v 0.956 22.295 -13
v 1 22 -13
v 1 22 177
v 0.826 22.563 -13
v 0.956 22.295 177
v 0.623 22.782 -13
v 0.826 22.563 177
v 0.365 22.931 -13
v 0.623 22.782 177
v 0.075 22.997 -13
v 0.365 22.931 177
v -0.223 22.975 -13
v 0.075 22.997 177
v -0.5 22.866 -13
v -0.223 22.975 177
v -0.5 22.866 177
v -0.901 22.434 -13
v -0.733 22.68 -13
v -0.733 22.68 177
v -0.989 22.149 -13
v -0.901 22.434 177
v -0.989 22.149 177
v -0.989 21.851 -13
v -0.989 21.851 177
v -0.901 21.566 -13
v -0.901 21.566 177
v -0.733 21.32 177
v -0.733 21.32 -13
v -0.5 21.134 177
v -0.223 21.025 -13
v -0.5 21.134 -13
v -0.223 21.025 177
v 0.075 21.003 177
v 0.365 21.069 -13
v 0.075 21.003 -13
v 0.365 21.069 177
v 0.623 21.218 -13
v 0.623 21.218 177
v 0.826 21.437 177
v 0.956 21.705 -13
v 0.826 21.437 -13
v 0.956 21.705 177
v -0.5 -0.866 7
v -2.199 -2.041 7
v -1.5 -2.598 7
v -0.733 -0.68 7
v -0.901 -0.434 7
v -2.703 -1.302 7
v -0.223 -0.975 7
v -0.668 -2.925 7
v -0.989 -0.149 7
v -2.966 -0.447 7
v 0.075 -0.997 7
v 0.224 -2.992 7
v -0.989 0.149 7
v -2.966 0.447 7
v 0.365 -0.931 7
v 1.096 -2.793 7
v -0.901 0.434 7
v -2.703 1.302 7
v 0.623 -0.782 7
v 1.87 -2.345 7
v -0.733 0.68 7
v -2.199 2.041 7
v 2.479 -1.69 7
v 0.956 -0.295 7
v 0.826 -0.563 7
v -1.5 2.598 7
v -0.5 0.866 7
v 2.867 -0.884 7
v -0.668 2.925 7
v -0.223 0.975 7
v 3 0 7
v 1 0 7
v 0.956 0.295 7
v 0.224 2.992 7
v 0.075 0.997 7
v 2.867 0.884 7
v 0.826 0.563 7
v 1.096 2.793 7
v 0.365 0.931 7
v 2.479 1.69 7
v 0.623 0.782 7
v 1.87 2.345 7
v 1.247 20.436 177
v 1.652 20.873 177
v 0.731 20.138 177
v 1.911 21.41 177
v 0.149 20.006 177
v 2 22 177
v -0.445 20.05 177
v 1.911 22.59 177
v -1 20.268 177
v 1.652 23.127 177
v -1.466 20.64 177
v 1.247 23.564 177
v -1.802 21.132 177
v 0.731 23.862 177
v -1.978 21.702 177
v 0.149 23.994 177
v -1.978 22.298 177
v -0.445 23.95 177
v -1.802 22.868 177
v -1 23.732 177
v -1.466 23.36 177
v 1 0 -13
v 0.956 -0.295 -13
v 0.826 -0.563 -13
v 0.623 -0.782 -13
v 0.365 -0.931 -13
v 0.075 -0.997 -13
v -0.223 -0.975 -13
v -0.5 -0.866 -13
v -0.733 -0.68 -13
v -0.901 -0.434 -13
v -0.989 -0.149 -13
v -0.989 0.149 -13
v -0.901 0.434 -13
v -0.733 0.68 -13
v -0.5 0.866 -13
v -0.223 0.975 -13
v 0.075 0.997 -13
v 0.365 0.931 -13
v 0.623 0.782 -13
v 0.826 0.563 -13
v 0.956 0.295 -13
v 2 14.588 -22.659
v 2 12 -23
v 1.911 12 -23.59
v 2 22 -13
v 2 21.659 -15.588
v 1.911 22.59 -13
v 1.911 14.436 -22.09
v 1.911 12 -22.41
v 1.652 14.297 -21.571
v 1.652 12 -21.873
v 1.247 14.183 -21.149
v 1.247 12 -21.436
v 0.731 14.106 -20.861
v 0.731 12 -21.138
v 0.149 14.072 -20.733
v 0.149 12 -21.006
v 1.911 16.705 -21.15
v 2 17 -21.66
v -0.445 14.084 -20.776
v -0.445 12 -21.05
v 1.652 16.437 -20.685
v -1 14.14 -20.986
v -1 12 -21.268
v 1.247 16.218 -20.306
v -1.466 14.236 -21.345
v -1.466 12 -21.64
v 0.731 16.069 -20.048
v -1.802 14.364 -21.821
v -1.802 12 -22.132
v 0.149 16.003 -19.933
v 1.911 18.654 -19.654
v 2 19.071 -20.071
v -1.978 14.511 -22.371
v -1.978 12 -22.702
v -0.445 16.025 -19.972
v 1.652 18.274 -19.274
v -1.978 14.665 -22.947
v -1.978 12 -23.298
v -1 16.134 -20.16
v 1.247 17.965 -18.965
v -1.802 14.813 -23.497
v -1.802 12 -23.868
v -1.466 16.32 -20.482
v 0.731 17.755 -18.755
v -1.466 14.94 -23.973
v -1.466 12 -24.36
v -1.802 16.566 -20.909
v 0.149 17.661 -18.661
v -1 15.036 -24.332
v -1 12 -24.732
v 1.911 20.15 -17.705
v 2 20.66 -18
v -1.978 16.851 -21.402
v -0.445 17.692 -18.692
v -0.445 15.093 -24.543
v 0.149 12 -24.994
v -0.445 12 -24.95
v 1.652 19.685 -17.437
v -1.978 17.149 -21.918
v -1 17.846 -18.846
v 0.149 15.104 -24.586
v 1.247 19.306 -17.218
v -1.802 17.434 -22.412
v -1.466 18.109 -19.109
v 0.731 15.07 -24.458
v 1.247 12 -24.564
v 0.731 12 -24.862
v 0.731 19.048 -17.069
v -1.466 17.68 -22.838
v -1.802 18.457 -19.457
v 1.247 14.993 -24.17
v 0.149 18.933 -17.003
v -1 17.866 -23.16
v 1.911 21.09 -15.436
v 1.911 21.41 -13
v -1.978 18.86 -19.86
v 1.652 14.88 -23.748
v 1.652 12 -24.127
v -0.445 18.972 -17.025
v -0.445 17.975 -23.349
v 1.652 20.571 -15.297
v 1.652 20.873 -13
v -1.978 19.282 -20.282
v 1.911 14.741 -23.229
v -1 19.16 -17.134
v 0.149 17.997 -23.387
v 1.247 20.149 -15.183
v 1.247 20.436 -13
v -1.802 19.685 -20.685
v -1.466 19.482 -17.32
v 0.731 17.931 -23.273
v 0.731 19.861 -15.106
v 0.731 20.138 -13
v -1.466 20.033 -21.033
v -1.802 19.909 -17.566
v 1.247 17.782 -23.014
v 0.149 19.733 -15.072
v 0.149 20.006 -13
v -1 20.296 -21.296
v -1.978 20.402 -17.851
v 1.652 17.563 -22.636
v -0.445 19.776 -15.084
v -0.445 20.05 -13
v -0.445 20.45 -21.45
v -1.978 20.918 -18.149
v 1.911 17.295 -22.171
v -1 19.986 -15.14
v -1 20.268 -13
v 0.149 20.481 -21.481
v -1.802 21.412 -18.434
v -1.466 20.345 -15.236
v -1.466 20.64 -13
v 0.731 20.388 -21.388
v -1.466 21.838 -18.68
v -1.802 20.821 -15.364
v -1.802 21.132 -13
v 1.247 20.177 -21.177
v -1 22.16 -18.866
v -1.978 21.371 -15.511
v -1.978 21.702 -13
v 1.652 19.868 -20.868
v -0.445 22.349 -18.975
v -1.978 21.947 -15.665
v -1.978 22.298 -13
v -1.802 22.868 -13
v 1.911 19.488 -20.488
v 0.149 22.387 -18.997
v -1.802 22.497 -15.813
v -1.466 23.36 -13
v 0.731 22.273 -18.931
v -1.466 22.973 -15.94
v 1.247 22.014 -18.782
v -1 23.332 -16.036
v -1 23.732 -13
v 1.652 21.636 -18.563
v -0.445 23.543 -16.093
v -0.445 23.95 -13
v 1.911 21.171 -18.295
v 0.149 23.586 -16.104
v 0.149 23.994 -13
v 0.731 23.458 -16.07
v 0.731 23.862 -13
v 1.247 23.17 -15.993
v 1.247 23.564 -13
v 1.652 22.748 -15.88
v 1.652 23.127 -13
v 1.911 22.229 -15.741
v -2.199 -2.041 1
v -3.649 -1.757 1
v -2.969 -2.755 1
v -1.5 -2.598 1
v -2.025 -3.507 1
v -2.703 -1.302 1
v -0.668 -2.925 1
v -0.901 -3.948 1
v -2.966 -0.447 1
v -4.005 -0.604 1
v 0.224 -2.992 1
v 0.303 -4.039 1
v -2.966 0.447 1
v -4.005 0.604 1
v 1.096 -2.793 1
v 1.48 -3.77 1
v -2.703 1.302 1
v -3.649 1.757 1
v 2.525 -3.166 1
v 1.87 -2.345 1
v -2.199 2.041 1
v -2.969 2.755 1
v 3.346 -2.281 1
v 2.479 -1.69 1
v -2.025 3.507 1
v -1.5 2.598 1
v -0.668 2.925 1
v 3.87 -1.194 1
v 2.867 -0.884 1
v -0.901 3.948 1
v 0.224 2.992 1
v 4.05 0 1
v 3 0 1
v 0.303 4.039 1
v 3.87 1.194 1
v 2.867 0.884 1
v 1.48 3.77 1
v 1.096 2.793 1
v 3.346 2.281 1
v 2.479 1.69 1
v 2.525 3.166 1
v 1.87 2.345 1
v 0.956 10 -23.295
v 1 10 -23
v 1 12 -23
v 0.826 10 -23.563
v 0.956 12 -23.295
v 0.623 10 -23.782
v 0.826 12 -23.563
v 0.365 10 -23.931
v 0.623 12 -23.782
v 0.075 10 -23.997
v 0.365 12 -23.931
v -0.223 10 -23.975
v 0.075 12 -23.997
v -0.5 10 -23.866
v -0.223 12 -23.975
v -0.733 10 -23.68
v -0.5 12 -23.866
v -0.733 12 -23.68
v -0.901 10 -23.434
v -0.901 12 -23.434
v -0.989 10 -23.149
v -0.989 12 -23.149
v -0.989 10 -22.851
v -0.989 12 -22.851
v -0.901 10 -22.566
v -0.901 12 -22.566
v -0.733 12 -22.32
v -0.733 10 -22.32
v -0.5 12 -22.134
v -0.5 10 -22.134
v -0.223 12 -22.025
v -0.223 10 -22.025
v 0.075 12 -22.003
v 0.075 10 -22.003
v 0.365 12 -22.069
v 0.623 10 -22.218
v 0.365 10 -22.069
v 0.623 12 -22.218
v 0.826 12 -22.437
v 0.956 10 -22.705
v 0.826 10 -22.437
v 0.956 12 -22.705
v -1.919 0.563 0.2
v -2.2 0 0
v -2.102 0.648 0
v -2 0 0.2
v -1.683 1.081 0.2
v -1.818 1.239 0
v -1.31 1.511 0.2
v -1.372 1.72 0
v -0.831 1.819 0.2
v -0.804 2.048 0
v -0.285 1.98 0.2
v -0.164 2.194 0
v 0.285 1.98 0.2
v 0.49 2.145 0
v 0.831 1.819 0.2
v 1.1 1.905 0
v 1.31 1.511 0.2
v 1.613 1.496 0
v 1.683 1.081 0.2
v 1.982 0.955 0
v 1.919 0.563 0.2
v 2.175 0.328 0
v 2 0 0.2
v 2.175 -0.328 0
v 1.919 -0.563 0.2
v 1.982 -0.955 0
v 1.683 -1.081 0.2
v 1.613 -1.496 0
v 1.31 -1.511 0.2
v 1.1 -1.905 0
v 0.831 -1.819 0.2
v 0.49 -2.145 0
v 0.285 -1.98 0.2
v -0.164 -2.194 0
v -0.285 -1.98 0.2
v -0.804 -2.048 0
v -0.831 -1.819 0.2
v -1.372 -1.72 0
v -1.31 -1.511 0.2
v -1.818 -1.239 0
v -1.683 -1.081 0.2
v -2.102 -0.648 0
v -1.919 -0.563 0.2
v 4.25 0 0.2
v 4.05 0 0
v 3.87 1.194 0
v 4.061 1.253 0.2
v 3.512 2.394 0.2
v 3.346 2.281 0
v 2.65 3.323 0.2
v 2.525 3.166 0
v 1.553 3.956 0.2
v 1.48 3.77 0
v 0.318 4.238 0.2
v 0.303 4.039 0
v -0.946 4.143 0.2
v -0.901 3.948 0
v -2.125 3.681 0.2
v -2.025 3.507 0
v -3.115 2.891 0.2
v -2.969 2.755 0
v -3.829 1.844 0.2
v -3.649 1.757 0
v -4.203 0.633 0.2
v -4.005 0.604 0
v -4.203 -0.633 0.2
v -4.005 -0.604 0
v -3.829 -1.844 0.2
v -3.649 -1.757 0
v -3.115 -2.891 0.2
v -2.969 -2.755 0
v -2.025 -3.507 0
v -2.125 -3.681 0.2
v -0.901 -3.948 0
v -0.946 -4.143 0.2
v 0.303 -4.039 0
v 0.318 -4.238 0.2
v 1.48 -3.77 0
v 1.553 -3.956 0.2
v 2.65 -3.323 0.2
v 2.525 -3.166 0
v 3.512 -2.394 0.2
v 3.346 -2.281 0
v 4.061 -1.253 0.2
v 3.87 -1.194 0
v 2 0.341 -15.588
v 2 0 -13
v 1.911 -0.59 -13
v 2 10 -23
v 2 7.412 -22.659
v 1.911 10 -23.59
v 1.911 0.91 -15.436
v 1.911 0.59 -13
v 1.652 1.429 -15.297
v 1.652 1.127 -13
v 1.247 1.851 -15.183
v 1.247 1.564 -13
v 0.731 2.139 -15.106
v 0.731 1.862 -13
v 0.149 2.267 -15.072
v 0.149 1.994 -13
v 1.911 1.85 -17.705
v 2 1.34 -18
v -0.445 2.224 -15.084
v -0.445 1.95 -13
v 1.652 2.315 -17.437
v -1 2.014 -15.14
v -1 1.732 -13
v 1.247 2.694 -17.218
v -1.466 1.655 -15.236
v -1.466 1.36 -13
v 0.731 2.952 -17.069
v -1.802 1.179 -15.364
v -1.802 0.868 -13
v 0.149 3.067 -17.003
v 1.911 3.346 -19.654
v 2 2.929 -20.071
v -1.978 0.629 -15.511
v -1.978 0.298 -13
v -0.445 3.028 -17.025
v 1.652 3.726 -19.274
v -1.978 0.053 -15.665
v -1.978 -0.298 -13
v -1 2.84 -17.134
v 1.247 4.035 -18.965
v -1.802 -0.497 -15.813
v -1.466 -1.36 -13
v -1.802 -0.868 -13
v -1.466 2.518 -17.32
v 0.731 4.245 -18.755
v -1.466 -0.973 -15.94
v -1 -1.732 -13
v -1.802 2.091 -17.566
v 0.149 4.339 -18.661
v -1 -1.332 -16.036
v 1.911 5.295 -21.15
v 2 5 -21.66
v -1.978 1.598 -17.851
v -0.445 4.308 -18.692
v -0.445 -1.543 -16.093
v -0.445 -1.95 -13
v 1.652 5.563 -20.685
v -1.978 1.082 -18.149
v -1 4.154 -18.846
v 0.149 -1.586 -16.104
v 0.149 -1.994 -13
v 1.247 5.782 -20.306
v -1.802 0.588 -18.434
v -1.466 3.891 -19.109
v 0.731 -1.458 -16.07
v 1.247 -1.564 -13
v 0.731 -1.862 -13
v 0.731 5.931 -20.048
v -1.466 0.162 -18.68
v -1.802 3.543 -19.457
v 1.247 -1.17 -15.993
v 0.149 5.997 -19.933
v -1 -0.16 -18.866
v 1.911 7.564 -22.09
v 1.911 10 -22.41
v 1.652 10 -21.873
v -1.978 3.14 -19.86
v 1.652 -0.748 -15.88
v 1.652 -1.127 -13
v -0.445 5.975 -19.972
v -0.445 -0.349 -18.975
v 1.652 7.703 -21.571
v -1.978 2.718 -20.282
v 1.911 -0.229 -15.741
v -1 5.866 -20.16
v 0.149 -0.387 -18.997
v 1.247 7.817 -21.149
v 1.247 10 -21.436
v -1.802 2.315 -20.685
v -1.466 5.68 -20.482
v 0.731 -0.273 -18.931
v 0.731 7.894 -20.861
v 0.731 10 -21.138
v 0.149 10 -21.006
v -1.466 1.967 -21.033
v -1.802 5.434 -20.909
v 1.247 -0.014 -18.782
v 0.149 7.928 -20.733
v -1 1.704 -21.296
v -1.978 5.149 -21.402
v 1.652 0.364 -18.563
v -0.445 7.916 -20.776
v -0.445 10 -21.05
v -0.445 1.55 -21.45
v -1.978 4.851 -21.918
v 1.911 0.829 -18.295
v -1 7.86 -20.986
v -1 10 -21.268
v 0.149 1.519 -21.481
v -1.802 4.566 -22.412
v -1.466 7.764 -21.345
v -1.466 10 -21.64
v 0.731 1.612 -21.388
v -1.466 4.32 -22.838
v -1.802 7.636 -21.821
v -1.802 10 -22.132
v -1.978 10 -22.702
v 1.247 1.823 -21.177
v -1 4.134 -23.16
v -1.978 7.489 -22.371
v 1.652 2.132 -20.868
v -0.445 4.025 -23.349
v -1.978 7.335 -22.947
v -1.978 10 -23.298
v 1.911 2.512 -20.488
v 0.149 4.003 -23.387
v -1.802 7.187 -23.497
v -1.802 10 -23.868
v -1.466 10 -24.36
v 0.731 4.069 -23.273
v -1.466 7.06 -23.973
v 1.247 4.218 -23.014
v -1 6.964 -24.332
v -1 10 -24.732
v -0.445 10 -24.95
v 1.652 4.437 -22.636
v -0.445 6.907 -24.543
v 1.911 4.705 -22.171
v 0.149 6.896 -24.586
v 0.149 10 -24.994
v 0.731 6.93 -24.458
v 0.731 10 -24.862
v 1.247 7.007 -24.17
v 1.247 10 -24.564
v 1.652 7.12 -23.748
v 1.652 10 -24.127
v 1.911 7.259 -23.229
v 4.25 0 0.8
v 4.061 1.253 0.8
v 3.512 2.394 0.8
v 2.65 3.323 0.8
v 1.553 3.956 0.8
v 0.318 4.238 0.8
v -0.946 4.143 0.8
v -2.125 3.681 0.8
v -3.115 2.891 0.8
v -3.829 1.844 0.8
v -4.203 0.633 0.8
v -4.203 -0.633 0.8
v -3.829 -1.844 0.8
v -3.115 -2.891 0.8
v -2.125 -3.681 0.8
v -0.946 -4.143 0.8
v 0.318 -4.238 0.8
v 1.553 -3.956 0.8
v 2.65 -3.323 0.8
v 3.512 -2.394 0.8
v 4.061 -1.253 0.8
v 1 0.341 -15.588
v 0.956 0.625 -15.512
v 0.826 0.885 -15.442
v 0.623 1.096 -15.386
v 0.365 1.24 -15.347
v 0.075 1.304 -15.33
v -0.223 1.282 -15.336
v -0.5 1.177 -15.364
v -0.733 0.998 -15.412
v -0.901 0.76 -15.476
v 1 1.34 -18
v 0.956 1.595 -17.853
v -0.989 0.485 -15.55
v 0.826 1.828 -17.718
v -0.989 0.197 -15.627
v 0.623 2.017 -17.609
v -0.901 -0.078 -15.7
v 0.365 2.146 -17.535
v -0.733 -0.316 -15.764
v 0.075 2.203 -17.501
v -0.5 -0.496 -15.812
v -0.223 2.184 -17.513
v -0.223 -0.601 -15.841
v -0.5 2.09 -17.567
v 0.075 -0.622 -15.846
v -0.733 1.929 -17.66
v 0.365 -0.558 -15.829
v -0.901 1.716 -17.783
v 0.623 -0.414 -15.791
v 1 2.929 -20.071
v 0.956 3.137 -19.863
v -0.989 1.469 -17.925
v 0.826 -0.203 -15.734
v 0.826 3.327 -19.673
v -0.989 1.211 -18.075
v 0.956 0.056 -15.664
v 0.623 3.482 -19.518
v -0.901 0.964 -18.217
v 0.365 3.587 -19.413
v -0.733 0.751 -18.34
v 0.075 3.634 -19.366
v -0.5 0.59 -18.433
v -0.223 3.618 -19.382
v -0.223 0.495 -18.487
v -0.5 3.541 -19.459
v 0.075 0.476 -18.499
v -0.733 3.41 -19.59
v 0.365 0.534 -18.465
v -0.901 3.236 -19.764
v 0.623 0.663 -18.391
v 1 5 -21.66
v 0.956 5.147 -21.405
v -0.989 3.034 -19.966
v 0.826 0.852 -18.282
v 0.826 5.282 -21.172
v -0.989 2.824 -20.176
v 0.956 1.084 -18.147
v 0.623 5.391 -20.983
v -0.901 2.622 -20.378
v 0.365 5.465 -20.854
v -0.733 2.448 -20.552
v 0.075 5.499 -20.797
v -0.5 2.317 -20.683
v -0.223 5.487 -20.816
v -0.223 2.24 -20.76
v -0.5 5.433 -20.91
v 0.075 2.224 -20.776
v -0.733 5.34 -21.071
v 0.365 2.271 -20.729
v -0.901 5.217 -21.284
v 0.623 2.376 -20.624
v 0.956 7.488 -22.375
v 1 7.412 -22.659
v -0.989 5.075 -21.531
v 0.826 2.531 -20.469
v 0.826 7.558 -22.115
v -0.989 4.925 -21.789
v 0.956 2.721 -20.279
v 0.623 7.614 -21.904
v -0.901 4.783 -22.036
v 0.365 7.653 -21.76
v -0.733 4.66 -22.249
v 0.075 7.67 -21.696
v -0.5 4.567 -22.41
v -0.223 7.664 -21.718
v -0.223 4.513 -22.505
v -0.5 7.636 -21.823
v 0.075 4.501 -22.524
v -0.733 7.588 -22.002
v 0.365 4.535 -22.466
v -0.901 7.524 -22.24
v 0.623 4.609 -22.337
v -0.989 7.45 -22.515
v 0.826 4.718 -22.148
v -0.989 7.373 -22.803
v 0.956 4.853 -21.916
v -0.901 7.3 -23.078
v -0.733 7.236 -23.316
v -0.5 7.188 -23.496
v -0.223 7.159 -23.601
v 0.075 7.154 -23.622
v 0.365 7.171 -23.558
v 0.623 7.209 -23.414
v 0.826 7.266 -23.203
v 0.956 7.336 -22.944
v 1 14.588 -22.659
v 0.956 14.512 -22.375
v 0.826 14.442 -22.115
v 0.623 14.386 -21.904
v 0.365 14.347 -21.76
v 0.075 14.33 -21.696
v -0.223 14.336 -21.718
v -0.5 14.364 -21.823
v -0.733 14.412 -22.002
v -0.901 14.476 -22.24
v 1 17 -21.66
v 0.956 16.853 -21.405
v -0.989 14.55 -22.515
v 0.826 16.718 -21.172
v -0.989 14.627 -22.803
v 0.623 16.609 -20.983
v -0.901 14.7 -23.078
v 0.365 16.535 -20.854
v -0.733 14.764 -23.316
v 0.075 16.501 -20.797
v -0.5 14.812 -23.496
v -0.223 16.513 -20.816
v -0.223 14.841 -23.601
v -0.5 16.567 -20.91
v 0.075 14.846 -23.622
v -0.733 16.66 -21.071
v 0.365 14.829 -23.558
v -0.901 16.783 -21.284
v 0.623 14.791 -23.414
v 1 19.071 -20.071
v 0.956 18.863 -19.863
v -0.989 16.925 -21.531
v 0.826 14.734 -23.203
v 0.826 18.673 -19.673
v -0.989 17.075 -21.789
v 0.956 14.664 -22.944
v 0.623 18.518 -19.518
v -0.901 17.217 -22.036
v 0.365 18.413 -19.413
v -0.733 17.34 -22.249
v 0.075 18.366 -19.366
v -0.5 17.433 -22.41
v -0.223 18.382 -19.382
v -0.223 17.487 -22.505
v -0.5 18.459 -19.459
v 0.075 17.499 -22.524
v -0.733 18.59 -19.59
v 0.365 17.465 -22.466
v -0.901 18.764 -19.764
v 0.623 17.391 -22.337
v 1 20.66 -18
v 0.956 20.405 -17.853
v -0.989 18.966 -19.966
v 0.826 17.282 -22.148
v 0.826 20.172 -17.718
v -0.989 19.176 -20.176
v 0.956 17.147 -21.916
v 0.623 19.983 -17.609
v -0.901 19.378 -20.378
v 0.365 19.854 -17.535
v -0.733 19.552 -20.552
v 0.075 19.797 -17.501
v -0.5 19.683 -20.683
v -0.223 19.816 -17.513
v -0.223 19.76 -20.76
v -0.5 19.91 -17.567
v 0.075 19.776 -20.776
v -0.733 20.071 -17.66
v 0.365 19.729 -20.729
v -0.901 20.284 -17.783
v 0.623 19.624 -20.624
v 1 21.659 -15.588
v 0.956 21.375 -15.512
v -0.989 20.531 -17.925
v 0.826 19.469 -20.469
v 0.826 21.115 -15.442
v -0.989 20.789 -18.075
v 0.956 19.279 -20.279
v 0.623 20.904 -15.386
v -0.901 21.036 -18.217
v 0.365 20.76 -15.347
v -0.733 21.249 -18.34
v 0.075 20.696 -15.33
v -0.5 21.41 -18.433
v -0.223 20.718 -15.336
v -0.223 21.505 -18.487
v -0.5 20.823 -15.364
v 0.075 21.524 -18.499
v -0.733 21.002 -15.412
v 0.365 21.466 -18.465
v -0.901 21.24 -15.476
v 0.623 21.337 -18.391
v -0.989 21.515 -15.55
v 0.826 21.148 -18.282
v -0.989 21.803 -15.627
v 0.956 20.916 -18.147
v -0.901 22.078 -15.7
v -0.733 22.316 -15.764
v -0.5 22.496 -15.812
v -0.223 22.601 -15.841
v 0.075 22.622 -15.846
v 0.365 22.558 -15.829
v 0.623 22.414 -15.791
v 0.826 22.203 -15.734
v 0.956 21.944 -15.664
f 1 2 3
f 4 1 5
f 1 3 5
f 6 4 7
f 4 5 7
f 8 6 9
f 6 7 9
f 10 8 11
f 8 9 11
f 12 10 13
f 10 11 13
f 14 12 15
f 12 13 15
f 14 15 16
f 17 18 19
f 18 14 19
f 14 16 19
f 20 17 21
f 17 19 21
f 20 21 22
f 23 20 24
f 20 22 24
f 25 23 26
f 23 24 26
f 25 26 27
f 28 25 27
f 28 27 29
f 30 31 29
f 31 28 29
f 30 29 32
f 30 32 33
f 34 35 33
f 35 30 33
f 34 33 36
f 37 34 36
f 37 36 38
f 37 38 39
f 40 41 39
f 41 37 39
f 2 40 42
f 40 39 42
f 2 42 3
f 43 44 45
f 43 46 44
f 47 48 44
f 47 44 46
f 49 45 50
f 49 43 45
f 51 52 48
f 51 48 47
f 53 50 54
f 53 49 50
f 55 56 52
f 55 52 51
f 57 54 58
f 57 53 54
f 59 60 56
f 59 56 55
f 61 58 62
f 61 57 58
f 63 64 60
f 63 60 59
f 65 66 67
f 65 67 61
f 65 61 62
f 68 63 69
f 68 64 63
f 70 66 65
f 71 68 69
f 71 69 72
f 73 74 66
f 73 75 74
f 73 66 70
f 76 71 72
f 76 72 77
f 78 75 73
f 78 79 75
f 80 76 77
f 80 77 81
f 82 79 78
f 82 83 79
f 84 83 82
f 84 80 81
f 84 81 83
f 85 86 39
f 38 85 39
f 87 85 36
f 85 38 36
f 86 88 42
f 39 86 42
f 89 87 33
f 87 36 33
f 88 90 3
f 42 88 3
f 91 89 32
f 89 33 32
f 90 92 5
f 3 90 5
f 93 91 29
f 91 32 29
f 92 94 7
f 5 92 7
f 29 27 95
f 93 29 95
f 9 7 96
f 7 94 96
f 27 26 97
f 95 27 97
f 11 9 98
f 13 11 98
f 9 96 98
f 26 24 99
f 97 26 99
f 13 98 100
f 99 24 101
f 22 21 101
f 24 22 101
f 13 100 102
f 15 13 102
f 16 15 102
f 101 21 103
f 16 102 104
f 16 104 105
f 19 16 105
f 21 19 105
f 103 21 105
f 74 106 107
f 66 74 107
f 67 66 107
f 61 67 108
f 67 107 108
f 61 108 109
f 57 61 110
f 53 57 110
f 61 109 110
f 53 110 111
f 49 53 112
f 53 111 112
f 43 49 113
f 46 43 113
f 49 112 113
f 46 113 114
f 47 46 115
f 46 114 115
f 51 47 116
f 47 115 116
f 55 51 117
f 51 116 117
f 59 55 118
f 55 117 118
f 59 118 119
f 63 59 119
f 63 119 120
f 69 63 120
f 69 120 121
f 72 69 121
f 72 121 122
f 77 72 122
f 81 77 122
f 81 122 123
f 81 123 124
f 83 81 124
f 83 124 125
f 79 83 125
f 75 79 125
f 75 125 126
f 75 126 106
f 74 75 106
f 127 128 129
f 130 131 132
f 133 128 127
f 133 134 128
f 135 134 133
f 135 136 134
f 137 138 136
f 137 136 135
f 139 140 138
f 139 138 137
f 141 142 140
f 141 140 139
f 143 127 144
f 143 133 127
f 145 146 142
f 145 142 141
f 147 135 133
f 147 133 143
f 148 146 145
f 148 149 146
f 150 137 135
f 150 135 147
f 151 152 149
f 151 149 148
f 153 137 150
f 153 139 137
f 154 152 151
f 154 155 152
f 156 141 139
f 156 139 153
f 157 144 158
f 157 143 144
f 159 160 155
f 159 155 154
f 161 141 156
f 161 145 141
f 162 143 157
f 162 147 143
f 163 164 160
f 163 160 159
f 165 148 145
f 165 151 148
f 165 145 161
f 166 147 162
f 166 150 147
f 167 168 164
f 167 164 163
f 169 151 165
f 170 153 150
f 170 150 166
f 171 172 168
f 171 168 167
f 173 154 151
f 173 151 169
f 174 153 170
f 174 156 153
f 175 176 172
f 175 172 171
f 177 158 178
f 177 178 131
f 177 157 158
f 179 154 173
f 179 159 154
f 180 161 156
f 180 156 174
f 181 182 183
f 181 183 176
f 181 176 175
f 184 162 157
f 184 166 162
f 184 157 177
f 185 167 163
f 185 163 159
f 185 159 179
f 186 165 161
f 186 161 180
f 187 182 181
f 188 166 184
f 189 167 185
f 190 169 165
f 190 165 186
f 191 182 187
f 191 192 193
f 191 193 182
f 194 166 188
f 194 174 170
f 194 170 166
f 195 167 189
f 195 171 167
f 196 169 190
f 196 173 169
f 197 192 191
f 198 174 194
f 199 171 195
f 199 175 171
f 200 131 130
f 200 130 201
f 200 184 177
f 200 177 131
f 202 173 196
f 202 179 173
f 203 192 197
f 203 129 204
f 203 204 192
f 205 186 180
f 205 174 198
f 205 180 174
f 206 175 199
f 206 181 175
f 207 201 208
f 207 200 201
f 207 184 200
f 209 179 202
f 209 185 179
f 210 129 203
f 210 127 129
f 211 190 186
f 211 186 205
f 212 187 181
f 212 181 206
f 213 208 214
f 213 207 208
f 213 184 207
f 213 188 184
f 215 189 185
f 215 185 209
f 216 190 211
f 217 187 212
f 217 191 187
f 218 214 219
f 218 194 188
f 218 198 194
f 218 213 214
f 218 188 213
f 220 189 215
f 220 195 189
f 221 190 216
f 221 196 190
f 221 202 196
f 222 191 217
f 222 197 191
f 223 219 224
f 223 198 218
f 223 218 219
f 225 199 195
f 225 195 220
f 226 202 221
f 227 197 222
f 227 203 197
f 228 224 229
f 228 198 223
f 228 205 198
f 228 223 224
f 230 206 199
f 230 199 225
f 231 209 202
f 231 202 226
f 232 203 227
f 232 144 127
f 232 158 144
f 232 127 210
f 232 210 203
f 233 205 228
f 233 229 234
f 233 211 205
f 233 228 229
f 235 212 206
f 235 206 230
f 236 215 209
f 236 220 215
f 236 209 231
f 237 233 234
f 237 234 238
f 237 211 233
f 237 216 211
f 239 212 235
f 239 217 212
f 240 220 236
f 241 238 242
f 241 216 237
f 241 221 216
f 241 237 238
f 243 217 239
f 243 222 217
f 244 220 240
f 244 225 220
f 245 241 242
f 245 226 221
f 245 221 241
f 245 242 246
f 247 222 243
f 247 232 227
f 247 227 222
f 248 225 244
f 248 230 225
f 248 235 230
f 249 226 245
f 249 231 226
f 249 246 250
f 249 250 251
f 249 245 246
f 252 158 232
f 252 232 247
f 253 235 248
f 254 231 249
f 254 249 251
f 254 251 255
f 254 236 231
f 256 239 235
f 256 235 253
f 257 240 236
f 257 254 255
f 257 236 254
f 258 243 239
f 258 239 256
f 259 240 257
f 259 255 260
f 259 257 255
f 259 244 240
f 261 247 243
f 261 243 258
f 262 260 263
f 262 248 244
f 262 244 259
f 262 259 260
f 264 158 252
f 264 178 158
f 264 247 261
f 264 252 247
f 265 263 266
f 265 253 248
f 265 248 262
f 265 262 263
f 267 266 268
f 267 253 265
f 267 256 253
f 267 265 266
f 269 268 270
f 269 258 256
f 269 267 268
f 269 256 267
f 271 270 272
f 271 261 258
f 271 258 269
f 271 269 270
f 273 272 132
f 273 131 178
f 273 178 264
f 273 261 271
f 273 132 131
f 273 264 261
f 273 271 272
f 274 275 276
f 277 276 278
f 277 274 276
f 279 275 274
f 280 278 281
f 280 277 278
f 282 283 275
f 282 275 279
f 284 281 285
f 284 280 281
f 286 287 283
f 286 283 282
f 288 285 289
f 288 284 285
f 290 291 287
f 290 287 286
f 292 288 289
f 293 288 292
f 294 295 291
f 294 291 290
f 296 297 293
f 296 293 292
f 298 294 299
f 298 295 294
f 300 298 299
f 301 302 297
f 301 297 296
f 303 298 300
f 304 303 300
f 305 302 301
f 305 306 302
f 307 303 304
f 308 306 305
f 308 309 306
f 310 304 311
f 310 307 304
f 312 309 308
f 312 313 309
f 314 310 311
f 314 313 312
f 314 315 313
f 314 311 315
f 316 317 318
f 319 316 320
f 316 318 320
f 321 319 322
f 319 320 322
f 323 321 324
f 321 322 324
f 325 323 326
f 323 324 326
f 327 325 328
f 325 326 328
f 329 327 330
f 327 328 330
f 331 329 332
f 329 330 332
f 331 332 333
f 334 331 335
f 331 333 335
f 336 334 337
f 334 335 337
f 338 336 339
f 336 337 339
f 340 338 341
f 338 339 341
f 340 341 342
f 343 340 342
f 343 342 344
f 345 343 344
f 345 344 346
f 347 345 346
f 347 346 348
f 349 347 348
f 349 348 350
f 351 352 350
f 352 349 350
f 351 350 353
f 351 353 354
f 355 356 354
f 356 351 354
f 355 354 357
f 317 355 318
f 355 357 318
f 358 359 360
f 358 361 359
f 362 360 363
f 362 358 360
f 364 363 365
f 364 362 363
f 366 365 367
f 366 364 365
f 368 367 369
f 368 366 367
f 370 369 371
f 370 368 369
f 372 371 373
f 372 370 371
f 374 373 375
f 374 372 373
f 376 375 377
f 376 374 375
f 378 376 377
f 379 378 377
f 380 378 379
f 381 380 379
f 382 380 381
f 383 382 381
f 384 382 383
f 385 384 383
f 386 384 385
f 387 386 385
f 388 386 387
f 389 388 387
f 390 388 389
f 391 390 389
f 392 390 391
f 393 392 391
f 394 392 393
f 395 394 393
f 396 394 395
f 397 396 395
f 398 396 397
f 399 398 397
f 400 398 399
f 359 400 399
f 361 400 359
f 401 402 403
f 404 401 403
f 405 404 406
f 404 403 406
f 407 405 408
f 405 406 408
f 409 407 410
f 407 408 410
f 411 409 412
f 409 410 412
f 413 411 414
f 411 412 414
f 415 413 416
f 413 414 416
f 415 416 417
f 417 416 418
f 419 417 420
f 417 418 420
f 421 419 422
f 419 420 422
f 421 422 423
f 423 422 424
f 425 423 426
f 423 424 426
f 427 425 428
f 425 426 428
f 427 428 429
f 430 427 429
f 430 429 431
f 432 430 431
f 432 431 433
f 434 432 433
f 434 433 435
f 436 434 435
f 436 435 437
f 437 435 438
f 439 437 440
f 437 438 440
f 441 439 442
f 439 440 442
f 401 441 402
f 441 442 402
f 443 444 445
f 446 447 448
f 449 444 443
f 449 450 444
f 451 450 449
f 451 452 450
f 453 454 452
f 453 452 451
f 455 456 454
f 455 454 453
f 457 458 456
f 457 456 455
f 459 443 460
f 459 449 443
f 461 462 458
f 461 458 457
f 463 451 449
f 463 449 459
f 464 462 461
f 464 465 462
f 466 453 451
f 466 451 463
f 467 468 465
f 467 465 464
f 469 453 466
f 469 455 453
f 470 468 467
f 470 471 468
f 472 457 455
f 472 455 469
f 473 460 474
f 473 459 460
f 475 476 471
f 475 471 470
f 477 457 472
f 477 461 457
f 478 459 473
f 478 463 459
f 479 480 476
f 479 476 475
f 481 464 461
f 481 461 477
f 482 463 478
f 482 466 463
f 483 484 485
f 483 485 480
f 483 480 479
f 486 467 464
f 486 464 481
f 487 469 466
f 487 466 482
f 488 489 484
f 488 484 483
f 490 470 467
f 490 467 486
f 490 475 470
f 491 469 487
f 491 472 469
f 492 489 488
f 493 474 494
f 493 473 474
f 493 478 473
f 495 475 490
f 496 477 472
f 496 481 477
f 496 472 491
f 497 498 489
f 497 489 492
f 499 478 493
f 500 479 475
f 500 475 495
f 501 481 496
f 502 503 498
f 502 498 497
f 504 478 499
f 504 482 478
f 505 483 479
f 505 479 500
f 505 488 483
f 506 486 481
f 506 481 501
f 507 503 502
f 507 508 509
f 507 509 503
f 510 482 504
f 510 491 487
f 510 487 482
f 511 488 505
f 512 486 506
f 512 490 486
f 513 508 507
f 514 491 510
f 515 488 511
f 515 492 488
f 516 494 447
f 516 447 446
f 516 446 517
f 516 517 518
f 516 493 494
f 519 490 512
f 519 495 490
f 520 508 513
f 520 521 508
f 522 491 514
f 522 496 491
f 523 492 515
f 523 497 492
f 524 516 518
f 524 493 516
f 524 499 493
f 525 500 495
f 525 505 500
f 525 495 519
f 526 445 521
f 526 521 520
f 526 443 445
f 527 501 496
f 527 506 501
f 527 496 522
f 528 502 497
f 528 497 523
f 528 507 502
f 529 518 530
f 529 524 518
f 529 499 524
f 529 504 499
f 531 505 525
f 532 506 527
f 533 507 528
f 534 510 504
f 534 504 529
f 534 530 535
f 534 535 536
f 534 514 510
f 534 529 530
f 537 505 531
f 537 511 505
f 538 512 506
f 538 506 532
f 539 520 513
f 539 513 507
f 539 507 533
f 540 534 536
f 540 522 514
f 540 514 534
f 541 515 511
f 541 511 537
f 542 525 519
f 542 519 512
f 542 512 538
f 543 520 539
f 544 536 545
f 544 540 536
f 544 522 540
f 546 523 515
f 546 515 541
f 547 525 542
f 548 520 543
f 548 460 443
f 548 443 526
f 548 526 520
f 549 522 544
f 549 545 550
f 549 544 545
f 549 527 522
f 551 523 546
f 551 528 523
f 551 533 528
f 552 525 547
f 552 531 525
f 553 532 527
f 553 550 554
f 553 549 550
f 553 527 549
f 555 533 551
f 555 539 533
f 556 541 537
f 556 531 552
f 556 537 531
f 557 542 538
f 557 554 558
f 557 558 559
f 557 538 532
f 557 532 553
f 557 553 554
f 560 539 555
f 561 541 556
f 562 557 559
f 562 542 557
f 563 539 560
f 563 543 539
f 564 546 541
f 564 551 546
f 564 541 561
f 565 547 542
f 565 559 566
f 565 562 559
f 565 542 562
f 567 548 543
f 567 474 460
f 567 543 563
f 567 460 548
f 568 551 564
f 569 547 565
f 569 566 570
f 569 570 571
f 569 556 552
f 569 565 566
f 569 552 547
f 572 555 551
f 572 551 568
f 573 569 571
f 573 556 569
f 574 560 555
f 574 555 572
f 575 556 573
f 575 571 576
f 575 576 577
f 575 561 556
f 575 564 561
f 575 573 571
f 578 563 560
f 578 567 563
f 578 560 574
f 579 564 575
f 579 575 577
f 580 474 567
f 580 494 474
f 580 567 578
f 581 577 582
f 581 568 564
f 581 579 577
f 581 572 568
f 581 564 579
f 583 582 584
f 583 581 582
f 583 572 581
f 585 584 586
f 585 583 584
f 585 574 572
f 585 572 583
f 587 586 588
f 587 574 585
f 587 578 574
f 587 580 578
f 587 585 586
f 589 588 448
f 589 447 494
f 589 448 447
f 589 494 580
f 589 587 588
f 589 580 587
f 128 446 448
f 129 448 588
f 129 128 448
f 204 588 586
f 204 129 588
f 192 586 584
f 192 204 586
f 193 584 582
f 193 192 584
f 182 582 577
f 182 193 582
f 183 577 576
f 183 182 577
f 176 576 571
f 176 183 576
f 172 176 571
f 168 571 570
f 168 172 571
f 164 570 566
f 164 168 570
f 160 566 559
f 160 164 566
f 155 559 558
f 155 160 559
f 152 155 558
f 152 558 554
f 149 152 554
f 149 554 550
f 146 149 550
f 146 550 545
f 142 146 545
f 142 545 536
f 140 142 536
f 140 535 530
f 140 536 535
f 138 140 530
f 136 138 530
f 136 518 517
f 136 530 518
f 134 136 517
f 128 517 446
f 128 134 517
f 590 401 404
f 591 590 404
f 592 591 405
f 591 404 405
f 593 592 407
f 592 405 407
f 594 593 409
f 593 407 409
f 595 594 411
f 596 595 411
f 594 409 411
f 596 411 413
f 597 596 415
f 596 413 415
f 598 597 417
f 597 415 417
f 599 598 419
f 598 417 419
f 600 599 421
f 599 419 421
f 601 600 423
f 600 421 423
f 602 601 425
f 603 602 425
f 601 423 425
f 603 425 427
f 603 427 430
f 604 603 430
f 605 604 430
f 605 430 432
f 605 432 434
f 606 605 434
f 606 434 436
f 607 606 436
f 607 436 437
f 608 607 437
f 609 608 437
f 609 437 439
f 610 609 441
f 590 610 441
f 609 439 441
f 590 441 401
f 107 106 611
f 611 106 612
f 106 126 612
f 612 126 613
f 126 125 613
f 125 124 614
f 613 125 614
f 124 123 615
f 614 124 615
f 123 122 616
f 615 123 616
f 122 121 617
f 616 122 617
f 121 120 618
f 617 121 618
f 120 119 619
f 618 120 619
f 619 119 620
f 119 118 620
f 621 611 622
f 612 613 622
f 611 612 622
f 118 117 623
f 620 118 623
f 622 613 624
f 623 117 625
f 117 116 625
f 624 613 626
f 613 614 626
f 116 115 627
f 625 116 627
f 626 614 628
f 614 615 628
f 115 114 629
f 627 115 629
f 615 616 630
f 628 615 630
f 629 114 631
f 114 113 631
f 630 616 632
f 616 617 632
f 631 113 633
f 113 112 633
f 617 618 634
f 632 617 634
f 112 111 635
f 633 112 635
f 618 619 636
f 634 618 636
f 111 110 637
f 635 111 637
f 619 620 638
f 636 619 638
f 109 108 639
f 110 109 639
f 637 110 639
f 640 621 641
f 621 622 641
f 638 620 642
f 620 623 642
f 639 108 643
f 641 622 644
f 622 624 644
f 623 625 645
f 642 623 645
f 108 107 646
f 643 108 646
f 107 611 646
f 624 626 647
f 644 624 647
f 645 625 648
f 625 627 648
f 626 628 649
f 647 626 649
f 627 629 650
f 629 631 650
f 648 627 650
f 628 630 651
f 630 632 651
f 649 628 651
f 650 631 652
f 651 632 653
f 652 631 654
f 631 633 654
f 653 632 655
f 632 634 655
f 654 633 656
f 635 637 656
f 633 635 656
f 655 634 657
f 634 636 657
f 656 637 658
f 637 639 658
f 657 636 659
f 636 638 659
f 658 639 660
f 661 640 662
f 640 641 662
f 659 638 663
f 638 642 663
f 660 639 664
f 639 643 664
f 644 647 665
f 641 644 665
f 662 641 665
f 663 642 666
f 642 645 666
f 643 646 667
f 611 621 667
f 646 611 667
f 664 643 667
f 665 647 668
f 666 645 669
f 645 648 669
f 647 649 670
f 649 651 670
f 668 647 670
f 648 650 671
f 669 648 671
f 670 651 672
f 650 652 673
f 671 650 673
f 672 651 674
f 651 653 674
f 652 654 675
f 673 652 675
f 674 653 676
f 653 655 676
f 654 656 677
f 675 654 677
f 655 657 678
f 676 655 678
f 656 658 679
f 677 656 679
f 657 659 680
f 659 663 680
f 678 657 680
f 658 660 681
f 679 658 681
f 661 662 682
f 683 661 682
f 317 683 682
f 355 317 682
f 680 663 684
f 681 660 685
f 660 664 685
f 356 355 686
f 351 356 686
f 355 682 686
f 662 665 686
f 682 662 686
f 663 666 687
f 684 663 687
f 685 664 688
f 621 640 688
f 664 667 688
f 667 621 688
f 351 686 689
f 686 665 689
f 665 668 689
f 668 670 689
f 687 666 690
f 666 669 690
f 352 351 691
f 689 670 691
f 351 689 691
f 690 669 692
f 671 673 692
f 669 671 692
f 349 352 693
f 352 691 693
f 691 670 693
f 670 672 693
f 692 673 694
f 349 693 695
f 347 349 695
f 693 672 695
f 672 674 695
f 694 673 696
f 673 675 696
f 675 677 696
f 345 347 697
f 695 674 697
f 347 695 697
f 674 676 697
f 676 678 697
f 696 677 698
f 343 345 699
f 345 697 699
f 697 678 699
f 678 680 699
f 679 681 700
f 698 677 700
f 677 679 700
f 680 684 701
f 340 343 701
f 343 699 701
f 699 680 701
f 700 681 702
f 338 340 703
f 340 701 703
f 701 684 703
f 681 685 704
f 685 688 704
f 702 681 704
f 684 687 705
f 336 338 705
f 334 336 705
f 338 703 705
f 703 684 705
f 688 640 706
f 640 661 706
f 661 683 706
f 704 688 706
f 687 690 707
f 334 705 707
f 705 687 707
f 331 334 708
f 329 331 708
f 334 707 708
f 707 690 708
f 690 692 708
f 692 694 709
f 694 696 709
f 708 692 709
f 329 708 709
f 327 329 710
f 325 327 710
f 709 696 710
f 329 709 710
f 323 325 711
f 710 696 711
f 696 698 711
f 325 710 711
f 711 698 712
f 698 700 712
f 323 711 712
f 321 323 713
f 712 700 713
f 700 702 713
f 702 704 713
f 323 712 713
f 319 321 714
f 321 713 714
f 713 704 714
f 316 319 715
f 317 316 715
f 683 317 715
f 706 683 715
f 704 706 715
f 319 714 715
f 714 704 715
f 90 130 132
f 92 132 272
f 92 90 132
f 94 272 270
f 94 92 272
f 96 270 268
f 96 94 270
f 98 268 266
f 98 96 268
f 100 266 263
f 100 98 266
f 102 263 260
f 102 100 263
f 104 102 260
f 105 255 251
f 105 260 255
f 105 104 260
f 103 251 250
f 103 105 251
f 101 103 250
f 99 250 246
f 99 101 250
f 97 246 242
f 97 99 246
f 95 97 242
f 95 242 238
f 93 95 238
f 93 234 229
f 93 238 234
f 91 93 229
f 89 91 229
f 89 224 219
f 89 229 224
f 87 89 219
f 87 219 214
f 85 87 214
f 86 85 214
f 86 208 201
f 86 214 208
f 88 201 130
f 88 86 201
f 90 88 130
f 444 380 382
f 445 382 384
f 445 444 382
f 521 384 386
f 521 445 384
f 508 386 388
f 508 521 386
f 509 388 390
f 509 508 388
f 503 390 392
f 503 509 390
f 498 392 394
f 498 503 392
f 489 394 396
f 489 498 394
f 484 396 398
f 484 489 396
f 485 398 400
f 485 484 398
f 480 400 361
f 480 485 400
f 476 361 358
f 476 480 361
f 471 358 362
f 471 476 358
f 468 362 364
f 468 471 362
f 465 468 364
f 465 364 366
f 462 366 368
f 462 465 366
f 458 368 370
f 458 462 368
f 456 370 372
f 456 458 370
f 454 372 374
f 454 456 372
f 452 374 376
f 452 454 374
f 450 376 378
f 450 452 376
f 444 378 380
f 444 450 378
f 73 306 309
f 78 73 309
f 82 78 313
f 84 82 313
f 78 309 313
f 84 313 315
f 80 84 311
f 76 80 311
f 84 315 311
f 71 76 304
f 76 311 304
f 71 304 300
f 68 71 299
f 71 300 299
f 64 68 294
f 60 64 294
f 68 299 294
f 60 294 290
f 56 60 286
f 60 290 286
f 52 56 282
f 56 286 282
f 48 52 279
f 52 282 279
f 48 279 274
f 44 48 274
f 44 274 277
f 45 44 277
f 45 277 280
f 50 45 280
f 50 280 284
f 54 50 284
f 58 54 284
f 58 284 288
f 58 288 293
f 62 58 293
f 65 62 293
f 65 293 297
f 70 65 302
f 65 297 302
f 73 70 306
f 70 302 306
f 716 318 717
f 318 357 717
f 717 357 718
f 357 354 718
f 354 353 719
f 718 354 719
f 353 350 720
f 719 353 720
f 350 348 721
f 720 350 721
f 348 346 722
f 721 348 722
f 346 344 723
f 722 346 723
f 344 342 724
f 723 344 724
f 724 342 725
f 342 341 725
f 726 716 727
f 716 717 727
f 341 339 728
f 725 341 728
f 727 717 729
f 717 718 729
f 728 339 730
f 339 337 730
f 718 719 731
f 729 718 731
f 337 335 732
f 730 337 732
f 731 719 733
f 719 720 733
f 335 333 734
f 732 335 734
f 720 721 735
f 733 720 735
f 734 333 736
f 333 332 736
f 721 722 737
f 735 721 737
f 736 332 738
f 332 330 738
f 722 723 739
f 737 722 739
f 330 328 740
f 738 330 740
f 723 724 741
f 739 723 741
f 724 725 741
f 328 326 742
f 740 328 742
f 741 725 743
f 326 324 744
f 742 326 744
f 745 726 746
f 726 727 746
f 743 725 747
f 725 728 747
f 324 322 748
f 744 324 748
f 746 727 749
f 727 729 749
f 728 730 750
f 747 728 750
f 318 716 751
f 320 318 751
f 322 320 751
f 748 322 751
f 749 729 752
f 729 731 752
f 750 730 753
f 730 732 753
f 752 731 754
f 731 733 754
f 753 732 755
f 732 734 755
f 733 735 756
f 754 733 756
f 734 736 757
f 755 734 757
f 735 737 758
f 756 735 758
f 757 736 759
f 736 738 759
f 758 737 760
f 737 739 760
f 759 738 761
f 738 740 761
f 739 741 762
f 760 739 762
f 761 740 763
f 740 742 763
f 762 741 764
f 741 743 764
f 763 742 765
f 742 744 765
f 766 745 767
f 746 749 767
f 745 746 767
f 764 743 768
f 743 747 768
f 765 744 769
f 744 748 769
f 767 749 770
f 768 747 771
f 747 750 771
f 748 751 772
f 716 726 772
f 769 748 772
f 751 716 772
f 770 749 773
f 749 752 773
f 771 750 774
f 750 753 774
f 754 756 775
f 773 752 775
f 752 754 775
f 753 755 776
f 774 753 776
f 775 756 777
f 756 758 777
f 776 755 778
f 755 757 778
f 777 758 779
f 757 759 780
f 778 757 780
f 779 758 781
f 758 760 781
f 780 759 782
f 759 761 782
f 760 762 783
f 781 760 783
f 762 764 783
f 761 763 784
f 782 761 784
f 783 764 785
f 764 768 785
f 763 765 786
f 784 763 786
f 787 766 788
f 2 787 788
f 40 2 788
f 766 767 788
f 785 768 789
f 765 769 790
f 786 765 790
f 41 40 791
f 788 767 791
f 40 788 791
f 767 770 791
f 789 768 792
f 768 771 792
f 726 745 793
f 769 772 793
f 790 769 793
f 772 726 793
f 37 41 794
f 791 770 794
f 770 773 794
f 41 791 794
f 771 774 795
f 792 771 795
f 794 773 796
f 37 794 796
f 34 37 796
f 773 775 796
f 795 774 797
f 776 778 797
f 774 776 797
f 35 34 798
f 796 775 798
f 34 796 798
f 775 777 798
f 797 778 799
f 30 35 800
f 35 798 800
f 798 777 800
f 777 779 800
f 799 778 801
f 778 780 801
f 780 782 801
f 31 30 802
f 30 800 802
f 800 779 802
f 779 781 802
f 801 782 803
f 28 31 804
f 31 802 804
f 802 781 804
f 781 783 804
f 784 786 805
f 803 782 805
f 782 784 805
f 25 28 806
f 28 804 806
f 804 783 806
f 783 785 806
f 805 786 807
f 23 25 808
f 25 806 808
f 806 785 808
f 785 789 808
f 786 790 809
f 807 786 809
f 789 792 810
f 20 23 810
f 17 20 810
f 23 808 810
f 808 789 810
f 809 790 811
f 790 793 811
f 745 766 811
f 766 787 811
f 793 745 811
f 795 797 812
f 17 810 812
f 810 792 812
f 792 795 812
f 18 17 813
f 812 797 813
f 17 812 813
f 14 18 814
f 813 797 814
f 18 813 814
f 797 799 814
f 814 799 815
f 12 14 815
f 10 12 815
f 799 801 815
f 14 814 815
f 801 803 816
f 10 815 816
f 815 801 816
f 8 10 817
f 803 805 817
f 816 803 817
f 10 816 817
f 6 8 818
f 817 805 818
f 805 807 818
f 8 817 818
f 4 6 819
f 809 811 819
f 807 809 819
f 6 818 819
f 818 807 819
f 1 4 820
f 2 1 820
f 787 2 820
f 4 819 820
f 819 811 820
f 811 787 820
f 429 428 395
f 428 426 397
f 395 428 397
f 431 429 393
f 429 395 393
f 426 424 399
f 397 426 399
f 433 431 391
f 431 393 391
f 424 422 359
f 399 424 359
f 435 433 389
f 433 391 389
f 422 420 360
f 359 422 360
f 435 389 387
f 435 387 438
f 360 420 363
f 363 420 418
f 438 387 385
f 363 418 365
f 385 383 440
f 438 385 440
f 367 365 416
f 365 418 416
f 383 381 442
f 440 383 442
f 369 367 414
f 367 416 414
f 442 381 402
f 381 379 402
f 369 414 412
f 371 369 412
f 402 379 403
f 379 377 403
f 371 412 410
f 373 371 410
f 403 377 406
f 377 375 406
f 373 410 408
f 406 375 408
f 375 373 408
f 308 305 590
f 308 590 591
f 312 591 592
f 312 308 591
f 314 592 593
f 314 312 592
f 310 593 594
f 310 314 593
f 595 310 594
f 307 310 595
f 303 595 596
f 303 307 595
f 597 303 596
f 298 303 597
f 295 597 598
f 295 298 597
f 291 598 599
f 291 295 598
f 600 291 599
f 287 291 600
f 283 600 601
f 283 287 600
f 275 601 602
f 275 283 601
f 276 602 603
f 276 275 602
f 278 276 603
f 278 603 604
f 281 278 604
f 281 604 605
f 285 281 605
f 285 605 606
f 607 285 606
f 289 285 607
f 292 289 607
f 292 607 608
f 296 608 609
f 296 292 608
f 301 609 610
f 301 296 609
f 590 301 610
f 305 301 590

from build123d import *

# Parameters (mm, degrees)
SKETCH1_R           = 4.25
BOSS_EXTRUDE1_DEPTH = 1
SKETCH2_R           = 3
BOSS_EXTRUDE2_DEPTH = 6
SKETCH3_R           = 2
CUT_EXTRUDE1_DEPTH  = 10.226321044
CHAMFER1_SIZE       = 0.2
SKETCH4_R           = 2
SKETCH4_R_2         = 1


with BuildPart() as part:
    # Sketch1 → Boss-Extrude1 (new body)
    with BuildSketch(Plane.XY):
        Circle(SKETCH1_R)
    extrude(amount=BOSS_EXTRUDE1_DEPTH)

    # Sketch2 → Boss-Extrude2 (add)
    with BuildSketch(Plane.XY.offset(1)):
        Circle(SKETCH2_R)
    extrude(amount=BOSS_EXTRUDE2_DEPTH)

    # Sketch3 → Cut-Extrude1 (cut, through all)
    with BuildSketch(Plane(origin=(0, 0, 0), x_dir=(-1, 0, 0), z_dir=(0, 0, -1))):
        Circle(SKETCH3_R)
    extrude(amount=-CUT_EXTRUDE1_DEPTH, mode=Mode.SUBTRACT)

    # Chamfer1
    chamfer1_edges = [part.edges().sort_by_distance(p)[0] for p in [
        (2, 0, 0),
        (-4.25, 0, 0),
        (-4.25, 0, 1),
    ]]
    chamfer(chamfer1_edges, length=CHAMFER1_SIZE)

    # Sweep1: sweep along a path in Sketch5
    with BuildLine(Plane(origin=(0, 0, 0), x_dir=(0, 0, -1), z_dir=(1, 0, 0))) as sweep1_path:
        Line((-7, 0), (13, 0))
        ThreePointArc((13, 0), (20.071067812, 2.928932188), (23, 10))
        Line((23, 10), (23, 12))
        ThreePointArc((23, 12), (20.071067812, 19.071067812), (13, 22))
        Line((13, 22), (-177, 22))
    # Sketch4 → Sweep1 (sweep)
    with BuildSketch(Plane.XY.offset(7)):
        Circle(SKETCH4_R)
        Circle(SKETCH4_R_2, mode=Mode.SUBTRACT)
    sweep(path=sweep1_path.line)


solid = part.part
